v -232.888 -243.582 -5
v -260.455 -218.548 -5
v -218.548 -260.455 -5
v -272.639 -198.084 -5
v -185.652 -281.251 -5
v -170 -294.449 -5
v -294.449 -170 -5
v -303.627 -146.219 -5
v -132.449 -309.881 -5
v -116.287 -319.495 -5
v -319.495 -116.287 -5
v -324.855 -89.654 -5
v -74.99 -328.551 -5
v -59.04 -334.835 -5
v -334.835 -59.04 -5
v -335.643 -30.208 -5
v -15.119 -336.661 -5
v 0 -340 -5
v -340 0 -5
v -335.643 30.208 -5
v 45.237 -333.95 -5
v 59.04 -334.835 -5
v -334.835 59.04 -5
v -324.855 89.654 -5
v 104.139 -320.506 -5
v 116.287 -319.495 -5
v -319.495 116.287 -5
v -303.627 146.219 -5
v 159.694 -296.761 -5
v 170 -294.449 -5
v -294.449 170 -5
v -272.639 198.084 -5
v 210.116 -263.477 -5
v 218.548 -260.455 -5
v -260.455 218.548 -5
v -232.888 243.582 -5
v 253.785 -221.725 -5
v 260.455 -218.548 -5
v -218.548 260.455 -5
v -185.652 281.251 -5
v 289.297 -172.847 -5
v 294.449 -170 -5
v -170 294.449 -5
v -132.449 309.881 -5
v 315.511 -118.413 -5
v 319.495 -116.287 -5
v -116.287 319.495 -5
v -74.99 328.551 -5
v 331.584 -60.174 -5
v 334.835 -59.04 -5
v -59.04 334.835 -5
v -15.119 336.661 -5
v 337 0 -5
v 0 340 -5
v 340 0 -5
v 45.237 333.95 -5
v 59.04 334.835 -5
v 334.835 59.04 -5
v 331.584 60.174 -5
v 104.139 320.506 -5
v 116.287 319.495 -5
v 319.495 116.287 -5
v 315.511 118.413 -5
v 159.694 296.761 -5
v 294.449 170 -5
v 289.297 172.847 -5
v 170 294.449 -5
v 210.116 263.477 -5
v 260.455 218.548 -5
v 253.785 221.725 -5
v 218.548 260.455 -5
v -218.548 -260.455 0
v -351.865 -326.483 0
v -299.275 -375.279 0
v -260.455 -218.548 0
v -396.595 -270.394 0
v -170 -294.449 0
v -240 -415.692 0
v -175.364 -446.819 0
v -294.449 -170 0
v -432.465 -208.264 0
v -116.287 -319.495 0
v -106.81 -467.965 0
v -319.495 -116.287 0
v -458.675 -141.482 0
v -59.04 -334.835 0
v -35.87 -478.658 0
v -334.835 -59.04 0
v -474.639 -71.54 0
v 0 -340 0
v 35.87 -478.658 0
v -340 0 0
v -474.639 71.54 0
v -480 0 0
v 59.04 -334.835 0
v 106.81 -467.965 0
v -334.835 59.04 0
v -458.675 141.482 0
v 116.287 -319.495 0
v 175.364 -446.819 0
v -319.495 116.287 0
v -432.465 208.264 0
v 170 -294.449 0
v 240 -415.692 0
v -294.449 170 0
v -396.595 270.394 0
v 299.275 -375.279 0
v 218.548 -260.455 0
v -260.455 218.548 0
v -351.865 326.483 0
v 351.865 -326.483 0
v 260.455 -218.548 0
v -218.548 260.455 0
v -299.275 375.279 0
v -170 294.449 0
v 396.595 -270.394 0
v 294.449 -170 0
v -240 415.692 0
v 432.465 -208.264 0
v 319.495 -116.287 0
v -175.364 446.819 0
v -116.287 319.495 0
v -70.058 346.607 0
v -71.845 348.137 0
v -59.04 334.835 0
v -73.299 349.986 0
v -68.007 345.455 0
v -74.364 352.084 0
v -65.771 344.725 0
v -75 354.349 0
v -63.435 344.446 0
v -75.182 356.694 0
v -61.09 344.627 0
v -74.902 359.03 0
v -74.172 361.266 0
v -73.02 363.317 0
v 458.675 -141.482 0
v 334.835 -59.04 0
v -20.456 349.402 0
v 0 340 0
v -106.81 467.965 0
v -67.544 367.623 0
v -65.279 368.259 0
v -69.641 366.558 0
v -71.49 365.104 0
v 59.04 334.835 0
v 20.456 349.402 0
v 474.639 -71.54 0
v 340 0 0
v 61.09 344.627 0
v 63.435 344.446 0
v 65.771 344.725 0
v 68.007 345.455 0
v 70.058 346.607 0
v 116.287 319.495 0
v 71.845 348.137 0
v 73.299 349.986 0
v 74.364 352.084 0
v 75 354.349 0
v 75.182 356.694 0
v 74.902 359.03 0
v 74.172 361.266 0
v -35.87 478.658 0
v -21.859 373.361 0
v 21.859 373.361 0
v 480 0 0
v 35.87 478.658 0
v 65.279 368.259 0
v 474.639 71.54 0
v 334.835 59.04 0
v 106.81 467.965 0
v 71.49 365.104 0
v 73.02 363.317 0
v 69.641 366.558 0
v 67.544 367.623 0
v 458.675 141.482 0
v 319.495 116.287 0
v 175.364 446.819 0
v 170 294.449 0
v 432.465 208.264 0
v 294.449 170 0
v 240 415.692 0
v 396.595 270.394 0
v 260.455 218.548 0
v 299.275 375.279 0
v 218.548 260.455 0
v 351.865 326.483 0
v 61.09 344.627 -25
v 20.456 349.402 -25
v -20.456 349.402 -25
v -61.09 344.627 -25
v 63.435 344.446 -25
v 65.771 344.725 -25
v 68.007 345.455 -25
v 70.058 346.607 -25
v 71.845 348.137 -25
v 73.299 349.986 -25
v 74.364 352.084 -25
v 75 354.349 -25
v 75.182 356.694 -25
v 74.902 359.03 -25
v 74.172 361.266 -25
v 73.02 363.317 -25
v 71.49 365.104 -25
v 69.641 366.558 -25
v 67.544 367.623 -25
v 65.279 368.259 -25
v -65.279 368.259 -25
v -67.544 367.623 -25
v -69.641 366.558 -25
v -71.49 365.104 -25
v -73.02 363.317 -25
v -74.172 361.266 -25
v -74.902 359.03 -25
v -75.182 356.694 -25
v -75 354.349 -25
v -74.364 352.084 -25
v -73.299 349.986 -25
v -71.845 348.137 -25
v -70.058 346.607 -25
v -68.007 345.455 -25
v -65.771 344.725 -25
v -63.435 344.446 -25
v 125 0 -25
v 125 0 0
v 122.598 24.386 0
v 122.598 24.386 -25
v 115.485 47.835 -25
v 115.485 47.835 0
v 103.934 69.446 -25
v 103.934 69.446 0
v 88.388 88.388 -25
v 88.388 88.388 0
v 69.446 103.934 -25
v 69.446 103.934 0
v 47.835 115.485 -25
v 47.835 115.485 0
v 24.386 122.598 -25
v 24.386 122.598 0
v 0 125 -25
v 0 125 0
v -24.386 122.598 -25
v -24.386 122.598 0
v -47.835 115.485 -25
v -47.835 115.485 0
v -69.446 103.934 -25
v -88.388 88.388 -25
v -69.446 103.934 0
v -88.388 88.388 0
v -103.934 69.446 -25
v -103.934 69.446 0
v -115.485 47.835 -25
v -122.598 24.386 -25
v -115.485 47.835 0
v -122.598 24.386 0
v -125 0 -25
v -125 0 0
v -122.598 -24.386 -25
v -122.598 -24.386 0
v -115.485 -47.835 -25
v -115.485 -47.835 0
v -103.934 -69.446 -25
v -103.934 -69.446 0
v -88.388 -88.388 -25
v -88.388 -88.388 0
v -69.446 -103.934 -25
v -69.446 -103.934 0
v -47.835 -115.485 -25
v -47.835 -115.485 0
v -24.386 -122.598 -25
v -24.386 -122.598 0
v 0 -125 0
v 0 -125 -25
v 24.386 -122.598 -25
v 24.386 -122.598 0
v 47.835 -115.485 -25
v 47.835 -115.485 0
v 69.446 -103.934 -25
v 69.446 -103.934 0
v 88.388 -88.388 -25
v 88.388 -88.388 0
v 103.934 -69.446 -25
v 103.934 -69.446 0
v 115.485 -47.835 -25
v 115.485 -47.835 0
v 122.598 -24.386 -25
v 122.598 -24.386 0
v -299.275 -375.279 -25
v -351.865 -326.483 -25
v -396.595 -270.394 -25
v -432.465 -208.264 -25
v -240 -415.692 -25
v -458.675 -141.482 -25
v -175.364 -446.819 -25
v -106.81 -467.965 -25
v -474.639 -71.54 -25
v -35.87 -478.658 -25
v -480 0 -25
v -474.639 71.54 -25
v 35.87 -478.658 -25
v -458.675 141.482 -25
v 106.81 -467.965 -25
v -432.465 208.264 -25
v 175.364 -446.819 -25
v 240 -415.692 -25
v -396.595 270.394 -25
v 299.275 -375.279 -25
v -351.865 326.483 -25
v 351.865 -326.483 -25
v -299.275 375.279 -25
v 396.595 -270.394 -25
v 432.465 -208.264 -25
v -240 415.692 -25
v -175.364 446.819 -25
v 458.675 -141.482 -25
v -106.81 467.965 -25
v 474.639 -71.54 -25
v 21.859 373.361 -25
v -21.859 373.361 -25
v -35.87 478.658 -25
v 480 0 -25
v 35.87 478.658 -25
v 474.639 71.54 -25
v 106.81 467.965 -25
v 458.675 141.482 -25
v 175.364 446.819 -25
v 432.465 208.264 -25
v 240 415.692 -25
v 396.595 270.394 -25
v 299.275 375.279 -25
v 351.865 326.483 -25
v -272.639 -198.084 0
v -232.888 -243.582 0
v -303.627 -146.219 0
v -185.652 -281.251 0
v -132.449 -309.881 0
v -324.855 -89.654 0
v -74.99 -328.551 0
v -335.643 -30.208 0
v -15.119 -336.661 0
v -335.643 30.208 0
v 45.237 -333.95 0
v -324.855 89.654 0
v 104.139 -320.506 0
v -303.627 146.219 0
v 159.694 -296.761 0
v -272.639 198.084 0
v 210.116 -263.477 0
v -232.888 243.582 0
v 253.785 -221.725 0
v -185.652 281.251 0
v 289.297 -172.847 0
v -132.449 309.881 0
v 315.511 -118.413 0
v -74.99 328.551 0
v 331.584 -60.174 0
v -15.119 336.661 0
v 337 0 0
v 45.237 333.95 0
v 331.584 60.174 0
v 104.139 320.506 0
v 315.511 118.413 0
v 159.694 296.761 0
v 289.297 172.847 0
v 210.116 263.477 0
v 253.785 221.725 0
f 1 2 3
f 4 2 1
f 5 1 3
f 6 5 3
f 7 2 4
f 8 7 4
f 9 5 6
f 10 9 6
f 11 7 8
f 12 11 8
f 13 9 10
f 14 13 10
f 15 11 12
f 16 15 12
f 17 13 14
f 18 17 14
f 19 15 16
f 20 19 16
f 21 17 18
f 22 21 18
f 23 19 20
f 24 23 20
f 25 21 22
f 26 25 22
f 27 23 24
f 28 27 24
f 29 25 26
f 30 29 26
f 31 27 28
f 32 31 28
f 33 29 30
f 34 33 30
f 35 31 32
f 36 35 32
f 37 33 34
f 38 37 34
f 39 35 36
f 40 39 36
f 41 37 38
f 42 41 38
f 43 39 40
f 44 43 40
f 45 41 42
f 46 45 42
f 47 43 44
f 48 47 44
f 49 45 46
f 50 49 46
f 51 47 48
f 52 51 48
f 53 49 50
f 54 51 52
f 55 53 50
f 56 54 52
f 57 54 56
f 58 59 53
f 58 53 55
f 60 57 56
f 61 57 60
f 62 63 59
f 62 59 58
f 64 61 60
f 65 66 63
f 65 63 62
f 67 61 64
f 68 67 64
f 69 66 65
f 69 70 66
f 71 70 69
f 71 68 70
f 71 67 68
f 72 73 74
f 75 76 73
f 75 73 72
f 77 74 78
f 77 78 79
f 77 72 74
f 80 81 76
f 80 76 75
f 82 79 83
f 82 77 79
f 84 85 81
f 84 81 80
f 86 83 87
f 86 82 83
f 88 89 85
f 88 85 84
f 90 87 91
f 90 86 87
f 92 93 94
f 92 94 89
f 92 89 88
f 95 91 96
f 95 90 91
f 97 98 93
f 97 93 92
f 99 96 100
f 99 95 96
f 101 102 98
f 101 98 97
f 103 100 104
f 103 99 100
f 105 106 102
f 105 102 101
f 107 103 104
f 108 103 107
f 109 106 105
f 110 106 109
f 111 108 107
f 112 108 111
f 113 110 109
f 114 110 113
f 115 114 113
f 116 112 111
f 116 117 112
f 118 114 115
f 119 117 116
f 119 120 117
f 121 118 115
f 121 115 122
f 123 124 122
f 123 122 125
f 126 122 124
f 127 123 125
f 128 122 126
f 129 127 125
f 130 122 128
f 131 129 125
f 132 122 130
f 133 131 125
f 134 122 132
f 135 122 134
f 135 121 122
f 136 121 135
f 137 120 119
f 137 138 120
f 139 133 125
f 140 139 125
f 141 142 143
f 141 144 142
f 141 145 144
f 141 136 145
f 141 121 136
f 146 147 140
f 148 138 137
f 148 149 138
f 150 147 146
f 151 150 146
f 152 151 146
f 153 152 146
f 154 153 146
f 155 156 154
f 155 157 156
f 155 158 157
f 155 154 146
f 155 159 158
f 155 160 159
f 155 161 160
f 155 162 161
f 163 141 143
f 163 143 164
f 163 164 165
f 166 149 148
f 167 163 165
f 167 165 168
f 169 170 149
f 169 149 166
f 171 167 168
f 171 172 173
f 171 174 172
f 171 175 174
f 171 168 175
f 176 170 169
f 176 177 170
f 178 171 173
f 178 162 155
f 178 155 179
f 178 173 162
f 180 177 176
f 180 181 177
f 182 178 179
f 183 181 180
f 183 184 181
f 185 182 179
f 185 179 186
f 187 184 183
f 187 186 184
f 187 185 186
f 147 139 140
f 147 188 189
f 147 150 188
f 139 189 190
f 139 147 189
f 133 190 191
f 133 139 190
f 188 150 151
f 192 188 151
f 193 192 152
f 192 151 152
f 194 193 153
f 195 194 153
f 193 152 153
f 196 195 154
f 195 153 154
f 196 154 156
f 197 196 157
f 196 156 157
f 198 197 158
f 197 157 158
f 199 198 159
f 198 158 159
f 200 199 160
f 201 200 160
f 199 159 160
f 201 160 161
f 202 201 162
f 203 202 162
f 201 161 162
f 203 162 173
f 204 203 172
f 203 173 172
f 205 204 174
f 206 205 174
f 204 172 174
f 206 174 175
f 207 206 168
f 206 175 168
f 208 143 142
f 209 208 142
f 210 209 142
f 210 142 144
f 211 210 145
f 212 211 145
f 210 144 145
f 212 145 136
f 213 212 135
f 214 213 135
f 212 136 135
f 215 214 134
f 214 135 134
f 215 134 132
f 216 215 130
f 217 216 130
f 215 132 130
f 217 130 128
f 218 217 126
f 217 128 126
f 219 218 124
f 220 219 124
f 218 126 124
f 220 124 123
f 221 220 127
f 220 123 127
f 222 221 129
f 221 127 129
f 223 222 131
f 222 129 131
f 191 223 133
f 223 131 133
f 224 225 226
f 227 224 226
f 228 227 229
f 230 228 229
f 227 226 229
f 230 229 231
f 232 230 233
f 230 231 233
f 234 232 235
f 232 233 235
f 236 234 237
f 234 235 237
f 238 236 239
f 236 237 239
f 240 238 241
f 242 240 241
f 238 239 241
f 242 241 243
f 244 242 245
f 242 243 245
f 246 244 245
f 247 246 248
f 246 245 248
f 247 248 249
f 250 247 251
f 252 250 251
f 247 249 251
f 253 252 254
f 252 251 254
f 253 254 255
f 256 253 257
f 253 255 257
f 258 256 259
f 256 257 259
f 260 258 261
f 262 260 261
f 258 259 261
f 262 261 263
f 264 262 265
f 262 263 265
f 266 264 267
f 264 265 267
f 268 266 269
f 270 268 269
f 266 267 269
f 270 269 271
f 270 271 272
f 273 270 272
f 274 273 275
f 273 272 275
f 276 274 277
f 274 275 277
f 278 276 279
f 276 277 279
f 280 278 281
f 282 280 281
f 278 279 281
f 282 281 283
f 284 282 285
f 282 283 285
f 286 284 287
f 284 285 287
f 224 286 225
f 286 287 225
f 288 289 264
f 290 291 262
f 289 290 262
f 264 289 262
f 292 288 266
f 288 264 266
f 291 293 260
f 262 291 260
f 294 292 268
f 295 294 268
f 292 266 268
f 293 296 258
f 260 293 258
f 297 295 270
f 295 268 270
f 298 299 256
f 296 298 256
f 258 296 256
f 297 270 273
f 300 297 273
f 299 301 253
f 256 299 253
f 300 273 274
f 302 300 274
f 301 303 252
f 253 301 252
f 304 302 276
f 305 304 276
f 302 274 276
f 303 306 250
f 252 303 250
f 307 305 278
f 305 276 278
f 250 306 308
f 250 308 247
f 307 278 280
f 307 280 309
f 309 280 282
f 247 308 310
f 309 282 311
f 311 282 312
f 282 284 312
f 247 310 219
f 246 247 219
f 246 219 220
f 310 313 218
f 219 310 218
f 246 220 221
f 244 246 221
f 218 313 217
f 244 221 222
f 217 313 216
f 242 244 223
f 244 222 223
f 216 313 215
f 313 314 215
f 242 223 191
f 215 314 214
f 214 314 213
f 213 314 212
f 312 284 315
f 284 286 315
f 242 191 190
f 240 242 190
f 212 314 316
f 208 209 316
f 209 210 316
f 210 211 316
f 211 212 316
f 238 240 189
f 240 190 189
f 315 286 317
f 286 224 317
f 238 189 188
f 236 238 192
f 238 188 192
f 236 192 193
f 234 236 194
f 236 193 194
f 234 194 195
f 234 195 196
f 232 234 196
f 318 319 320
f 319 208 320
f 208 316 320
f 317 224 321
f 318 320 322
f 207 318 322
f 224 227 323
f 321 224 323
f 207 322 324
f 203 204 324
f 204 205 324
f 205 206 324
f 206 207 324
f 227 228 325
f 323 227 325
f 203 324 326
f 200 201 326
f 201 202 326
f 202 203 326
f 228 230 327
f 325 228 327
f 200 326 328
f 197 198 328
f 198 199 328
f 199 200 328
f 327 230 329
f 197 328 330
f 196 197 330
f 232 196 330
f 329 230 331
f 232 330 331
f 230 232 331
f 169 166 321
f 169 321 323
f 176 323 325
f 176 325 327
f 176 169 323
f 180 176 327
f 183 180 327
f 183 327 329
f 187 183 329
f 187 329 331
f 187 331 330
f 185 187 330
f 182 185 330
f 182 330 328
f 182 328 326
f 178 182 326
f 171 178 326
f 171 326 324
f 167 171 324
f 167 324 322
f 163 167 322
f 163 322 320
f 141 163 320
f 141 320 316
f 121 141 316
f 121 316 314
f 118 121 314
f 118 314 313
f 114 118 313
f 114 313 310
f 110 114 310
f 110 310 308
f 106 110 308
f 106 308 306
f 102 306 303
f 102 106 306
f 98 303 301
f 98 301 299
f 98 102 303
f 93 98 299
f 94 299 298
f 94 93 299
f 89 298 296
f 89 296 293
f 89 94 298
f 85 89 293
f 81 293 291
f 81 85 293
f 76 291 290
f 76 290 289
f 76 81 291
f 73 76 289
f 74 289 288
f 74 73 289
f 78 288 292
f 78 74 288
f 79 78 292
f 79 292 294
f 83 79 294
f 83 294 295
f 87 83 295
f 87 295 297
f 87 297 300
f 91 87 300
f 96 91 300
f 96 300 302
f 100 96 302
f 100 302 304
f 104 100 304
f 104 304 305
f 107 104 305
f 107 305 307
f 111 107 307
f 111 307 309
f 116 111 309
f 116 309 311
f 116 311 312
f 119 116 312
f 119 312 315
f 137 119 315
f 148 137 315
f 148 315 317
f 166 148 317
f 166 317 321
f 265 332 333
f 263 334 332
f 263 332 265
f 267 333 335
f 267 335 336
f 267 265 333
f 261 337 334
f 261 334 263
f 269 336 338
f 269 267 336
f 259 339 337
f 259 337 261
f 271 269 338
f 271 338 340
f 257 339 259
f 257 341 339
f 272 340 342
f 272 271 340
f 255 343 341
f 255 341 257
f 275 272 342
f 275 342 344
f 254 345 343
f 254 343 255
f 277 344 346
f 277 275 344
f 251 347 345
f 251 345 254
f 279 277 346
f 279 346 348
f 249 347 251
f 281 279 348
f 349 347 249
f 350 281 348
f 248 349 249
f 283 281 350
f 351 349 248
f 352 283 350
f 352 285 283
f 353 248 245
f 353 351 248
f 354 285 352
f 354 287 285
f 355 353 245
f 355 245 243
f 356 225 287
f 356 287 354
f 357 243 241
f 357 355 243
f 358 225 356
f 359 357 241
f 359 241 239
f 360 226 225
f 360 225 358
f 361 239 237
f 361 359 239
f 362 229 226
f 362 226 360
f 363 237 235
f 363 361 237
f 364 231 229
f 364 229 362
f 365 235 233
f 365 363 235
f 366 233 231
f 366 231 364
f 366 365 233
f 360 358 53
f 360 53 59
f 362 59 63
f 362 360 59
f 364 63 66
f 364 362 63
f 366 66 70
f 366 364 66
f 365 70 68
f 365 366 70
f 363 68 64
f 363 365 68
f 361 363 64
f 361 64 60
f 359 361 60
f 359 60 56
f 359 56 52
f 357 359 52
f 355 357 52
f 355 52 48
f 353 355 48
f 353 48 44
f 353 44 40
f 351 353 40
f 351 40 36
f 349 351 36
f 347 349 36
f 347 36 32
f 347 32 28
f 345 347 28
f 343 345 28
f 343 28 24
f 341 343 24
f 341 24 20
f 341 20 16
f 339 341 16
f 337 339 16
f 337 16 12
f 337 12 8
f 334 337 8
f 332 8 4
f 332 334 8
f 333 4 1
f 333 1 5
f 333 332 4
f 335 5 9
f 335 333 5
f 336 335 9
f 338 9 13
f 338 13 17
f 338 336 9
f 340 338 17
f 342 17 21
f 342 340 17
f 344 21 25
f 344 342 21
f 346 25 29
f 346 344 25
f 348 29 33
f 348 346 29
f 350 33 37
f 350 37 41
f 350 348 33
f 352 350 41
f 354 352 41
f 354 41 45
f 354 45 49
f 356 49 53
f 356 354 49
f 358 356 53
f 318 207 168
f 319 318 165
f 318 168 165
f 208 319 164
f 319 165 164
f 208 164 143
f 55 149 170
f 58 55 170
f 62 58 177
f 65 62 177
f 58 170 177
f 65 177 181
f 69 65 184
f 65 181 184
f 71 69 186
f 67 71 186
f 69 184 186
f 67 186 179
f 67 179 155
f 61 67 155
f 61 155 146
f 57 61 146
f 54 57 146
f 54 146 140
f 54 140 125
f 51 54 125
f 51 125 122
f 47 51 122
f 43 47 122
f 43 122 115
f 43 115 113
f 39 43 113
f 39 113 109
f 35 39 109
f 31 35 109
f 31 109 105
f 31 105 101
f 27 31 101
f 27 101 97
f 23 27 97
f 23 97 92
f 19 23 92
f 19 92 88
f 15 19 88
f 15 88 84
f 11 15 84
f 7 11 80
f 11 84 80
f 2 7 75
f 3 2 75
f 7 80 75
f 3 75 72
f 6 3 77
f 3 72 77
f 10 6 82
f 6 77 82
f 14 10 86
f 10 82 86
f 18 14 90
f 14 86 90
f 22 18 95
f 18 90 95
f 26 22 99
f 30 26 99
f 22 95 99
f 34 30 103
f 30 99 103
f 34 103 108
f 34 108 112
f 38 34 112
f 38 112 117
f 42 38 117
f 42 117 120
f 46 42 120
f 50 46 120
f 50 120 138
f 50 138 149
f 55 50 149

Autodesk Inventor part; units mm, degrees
ref_plane "YZ Plane" through (0, 0, 0) normal (1, 0, 0) x (0, 1, 0)
ref_plane "XZ Plane" through (0, 0, 0) normal (0, 1, 0) x (-1, 0, 0)
ref_plane "XY Plane" through (0, 0, 0) normal (0, 0, 1) x (1, 0, 0)
sketch "Boceto1" plane through (0, 0, 0) normal (0, 0, 1) x (1, 0, 0)
  circle A0 centre (0, 0) radius 480
  circle A1 centre (0, 0) radius 125
  dimension "d0" = 960
  dimension "d1" = 250
extrude "Extrusión1" add sketch "Boceto1" against normal blind 25
sketch "Boceto2" plane through (0, 0, 0) normal (0, 0, 1) x (1, 0, 0)
  circle A0 centre (0, 0) radius 337
  circle A1 centre (0, 0) radius 340
  dimension "d4" = 680
  dimension "d5" = 674
extrude "Extrusión2" cut sketch "Boceto2" against normal blind 5
sketch "Boceto3" plane through (0, 0, 0) normal (0, 0, 1) x (1, 0, 0)
  arc A0 (63.1842, 356.4432) -> (-63.1842, 356.4432) centre (0, 0) ccw construction
  arc A1 (65.2787, 368.259) -> (-65.2787, 368.259) centre (0, 0) ccw
  arc A2 (61.0897, 344.6274) -> (-61.0897, 344.6274) centre (0, 0) ccw
  arc A3 (61.0897, 344.6274) -> (65.2787, 368.259) centre (63.1842, 356.4432) ccw
  arc A4 (-65.2787, 368.259) -> (-61.0897, 344.6274) centre (-63.1842, 356.4432) ccw
  line L0 (0, -74.8) -> (0, 448.8) projected
  point P0 (75, 354.3487)
  point P1 (-75, 354.3487)
  point P2 (0, 362)
  dimension "d8" = 12
  dimension "d9" = 362
  dimension "d15" = 150
extrude "Extrusión3" cut sketch "Boceto3" against normal up to next
properties part number "Brida_1 (flange_1) Lebus"
